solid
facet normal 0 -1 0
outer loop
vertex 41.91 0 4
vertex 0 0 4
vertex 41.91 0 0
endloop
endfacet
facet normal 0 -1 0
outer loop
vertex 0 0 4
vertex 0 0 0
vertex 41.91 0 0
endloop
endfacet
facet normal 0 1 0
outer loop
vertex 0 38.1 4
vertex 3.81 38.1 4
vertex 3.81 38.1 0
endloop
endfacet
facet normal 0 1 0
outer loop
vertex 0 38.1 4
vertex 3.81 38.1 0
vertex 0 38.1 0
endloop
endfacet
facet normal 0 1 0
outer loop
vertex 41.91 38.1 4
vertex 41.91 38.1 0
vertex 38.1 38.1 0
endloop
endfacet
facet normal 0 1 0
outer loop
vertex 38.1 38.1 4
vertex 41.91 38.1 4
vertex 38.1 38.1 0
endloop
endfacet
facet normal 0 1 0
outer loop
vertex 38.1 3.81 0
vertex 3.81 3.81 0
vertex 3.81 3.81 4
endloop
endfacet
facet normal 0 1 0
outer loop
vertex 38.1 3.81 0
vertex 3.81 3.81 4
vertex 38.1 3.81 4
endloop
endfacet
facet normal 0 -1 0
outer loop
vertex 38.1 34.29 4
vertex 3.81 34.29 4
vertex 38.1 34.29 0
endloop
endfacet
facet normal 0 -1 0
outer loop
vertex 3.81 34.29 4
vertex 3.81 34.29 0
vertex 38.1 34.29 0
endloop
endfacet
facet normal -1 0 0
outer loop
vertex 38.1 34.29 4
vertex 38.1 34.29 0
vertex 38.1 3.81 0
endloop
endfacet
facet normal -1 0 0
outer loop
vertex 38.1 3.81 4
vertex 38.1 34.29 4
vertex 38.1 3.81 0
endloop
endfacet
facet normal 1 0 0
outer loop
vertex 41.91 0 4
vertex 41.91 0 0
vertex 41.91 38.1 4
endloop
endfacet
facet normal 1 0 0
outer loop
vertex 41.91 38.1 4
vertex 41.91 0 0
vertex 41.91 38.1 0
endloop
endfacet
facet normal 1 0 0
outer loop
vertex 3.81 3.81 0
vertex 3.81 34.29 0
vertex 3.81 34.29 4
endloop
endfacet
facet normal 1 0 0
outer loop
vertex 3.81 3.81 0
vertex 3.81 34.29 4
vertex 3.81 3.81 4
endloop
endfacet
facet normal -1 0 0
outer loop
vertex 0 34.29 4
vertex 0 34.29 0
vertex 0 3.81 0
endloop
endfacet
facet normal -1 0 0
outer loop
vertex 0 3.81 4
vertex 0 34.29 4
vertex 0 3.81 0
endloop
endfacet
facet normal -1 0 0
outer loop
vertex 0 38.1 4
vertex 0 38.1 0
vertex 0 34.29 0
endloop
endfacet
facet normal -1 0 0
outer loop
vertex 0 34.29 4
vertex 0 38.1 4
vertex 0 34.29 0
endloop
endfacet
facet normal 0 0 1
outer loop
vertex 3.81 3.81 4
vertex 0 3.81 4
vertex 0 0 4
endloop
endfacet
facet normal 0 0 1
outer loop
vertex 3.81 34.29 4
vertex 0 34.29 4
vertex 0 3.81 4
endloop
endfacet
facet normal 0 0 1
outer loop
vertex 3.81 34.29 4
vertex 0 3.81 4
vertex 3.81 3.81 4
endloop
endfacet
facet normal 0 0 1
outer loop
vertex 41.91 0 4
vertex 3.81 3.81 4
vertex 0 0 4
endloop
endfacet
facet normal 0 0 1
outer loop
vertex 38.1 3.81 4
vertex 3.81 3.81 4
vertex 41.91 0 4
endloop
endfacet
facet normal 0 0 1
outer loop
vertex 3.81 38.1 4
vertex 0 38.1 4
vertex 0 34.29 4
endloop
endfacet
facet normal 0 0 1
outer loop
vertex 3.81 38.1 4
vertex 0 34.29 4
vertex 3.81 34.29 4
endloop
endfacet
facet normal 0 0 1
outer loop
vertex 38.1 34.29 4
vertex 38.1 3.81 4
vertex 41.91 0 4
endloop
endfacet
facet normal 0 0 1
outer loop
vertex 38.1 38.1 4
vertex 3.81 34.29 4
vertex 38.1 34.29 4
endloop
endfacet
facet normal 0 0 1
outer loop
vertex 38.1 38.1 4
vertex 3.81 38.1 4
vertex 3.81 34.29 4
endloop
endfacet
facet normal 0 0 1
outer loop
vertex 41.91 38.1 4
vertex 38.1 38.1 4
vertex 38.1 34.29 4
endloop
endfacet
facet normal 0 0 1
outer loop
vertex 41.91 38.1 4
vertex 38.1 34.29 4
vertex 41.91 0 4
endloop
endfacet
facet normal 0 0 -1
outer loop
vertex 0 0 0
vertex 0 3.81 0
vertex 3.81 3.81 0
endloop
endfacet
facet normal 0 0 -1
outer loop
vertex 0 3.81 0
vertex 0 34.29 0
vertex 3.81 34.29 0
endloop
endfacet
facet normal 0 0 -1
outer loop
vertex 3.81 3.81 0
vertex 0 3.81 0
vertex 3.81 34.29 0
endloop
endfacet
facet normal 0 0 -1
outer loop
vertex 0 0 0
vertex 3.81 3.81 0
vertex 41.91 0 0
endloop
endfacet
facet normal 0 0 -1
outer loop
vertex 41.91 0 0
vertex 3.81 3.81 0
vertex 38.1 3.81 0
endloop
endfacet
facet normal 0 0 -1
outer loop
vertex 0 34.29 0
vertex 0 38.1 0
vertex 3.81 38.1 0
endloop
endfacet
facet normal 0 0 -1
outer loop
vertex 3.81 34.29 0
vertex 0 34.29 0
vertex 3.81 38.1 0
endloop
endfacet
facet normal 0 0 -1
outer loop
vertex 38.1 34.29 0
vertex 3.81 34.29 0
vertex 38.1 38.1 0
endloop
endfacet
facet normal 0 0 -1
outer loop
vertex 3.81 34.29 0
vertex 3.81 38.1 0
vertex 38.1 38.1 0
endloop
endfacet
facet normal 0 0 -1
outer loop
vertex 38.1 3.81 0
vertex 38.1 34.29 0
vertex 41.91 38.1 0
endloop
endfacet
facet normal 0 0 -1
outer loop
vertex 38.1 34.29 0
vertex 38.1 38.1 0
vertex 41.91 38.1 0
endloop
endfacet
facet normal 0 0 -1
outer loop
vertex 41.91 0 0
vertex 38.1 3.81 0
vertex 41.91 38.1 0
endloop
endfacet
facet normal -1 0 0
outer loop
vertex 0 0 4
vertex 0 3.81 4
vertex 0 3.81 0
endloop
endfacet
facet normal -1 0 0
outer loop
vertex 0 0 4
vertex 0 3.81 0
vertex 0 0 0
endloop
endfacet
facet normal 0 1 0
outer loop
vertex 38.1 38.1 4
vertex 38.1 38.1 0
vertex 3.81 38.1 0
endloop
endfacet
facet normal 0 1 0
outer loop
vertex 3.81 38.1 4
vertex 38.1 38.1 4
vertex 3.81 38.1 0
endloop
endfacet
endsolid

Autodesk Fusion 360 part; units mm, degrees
sketch "Sketch1" plane through (0, 0, 0) normal (0, 0, 1) x (1, 0, 0)
  line L0 (0, 0) -> (41.91, 0)
  line L1 (41.91, 0) -> (41.91, 38.1)
  line L2 (41.91, 38.1) -> (0, 38.1)
  line L3 (0, 38.1) -> (0, 0)
  line L4 (0, 38.1) -> (3.81, 38.1)
  line L5 (3.81, 34.29) -> (3.81, 3.81)
  line L6 (0, 0) -> (0, 3.81)
  line L7 (3.81, 3.81) -> (38.1, 3.81)
  line L8 (0, 38.1) -> (0, 34.29)
  line L9 (3.81, 34.29) -> (38.1, 34.29)
  line L10 (41.91, 38.1) -> (38.1, 38.1)
  line L11 (38.1, 34.29) -> (38.1, 3.81)
  dimension "d1" = 41.91
  dimension "d2" = 38.1
  dimension "d3" = 3.81
  dimension "d4" = 3.81
  dimension "d5" = 3.81
  dimension "d6" = 3.81
sketch "Sketch2" plane through (0, 0, 0) normal (0, 0, 1) x (1, 0, 0)
extrude "Extrude1" add sketch "Sketch1" along normal blind 4
